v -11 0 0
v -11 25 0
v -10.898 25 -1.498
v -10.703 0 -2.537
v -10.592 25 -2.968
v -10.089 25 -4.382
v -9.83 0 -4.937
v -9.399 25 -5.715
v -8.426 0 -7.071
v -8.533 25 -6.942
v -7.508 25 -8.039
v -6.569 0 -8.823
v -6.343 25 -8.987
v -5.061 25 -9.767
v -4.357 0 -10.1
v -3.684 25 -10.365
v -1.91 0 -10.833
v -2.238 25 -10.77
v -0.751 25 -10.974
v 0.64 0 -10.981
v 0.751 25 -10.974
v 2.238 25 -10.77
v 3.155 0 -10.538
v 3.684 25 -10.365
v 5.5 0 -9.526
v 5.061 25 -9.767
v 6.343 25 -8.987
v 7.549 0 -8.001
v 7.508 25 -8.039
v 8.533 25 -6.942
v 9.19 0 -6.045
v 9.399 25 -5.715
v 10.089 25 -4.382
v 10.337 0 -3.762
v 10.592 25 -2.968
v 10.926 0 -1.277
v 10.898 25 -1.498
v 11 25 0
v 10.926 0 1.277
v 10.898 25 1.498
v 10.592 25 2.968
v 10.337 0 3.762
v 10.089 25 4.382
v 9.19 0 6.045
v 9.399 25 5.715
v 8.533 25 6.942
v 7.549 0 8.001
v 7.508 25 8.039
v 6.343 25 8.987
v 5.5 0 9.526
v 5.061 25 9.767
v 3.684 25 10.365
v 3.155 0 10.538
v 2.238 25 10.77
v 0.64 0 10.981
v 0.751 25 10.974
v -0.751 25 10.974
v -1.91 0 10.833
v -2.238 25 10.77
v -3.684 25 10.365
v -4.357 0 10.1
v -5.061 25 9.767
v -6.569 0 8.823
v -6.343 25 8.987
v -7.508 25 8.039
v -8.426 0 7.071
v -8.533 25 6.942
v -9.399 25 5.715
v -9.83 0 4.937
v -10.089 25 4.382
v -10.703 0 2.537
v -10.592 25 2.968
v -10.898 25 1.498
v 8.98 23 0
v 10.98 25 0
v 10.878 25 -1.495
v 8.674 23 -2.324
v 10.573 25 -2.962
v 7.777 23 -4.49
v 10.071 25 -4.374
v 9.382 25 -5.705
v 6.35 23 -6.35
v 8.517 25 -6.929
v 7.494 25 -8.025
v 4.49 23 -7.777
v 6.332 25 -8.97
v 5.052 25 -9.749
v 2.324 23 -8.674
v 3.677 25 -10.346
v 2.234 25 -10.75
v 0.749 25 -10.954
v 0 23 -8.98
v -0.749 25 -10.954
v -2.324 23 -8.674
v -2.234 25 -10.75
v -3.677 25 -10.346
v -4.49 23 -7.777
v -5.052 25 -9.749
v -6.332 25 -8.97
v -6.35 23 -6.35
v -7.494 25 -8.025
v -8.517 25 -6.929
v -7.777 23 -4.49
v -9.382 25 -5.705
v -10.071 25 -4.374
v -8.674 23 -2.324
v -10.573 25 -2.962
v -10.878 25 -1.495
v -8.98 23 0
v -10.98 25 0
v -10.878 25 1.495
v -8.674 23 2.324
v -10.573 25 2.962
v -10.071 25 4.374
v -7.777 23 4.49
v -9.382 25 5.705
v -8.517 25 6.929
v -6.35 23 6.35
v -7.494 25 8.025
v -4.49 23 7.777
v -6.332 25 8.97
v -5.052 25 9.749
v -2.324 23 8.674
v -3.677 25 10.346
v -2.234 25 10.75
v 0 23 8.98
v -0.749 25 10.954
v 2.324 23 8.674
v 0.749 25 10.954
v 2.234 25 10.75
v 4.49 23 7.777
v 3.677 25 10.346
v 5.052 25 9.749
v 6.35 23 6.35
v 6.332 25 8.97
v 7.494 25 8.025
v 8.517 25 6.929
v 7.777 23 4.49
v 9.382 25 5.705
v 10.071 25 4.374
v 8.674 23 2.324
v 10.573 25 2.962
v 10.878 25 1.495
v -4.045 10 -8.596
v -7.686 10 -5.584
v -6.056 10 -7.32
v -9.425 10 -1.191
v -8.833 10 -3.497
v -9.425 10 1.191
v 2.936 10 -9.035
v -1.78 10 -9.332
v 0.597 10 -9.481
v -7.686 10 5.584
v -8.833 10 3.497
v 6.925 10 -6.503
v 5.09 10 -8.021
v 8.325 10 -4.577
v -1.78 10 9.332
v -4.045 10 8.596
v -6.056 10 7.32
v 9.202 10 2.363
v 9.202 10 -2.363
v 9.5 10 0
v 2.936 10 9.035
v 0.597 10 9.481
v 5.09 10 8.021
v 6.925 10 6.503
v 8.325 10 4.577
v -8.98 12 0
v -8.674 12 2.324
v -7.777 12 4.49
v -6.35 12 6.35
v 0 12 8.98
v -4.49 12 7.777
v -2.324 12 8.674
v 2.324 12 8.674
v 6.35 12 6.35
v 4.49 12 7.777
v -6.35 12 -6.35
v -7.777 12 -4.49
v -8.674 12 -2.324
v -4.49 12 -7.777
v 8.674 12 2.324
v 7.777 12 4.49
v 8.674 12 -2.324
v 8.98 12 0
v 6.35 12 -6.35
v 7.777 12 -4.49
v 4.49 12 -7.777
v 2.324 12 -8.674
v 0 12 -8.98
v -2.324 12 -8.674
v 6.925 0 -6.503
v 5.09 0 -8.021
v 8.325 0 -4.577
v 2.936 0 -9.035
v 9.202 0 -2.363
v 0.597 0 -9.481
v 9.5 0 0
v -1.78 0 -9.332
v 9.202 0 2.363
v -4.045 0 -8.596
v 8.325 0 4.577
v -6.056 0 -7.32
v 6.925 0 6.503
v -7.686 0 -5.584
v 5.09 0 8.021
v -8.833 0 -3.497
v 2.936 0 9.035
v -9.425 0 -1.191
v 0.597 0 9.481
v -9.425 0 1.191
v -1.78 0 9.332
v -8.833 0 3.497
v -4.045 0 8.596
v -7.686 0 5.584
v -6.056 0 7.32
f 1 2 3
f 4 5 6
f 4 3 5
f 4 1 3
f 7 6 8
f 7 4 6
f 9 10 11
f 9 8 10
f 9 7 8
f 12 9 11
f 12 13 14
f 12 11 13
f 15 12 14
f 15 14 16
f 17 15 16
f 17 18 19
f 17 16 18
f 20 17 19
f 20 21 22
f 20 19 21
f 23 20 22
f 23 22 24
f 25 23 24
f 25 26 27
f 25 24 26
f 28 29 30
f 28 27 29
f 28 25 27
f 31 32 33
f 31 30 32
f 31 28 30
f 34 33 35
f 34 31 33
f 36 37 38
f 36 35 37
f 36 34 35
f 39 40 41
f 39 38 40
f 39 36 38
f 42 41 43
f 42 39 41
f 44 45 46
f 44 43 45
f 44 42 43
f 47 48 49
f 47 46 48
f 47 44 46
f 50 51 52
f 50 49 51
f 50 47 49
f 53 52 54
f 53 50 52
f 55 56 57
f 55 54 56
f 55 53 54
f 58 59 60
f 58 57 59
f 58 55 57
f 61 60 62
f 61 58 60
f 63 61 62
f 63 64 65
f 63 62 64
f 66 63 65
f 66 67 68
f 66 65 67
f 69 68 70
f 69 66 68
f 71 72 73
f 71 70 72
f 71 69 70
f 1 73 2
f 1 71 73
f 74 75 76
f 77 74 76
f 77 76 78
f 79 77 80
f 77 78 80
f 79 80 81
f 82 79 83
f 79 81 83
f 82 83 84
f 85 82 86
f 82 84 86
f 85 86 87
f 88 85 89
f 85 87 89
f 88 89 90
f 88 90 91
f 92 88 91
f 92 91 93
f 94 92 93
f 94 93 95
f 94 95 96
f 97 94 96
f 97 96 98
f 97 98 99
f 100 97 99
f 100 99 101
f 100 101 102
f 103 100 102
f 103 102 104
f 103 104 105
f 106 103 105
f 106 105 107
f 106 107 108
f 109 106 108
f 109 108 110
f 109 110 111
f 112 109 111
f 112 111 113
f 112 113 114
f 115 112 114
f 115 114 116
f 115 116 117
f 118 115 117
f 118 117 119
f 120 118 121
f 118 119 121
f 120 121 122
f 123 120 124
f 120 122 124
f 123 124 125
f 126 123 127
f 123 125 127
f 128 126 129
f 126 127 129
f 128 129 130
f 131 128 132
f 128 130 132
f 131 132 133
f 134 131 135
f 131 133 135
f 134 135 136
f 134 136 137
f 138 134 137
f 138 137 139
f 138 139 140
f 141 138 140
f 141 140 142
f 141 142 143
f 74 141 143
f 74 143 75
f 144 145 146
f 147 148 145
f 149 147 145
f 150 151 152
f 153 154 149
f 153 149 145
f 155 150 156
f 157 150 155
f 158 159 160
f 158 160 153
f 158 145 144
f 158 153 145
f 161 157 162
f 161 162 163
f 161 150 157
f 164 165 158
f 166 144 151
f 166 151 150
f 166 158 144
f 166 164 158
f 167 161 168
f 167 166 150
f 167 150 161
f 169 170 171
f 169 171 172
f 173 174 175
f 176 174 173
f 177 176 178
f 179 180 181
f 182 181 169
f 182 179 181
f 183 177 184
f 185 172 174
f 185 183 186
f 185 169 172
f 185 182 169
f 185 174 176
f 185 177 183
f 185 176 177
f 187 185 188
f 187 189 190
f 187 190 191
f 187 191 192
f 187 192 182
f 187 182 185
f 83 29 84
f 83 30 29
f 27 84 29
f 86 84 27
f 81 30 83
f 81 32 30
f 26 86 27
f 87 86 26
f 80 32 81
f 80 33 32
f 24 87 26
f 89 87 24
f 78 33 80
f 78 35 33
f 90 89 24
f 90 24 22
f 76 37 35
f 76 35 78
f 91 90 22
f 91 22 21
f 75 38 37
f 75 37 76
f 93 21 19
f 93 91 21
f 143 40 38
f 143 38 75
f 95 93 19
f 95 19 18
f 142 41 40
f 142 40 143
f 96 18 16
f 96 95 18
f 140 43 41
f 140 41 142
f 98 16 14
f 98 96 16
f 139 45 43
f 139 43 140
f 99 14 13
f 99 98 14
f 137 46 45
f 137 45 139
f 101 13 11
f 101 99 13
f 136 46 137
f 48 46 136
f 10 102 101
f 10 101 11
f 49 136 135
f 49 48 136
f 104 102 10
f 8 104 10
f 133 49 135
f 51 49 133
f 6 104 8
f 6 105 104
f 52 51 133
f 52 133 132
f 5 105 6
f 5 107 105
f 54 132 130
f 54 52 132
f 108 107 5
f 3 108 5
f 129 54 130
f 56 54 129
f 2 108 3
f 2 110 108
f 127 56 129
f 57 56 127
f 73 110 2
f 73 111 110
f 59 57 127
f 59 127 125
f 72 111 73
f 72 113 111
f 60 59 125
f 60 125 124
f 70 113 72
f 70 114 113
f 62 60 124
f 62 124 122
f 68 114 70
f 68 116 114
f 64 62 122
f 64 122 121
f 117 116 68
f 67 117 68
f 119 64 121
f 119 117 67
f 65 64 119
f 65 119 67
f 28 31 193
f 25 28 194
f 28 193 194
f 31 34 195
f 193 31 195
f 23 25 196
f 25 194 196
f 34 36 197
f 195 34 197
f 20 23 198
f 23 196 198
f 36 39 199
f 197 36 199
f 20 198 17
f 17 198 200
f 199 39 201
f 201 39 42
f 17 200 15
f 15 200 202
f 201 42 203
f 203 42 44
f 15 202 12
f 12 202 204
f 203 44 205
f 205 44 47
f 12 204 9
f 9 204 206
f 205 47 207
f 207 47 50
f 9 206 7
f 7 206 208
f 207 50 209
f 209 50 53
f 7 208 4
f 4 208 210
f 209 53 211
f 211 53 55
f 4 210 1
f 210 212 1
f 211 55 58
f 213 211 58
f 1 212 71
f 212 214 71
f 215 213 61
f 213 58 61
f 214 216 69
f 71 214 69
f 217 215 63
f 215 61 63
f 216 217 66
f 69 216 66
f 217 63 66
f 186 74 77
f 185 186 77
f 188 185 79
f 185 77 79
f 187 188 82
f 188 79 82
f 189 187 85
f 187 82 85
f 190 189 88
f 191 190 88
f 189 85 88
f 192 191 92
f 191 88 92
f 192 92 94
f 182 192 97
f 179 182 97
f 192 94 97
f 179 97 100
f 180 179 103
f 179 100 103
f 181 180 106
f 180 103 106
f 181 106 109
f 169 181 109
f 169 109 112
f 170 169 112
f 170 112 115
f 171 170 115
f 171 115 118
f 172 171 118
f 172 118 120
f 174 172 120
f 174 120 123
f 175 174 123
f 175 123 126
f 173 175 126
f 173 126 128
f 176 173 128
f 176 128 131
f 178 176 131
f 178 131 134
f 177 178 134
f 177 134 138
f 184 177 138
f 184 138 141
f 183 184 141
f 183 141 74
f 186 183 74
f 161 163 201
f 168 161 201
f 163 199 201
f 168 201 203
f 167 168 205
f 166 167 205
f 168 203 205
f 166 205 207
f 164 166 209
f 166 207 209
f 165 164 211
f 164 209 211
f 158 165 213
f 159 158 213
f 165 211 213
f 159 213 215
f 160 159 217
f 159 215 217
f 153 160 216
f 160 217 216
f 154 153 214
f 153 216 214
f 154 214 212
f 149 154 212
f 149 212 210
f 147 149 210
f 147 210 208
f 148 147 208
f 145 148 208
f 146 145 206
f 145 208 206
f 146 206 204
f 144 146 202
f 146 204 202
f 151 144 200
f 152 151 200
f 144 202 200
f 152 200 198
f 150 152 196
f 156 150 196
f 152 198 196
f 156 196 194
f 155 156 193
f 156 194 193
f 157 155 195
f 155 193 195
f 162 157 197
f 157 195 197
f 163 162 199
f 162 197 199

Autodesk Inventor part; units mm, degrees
ref_plane "YZ Plane" through (0, 0, 0) normal (1, 0, 0) x (0, 1, 0)
ref_plane "XZ Plane" through (0, 0, 0) normal (0, 1, 0) x (-1, 0, 0)
ref_plane "XY Plane" through (0, 0, 0) normal (0, 0, 1) x (1, 0, 0)
sketch "Sketch1" plane through (0, 0, 0) normal (0, 1, 0) x (-1, 0, 0)
  circle A0 centre (0, 0) radius 11
  dimension "d0" = 22
extrude "Extrusion1" add sketch "Sketch1" along normal blind 25
sketch "Sketch2" plane through (0, 0, 0) normal (0, -1, 0) x (1, 0, 0)
  circle A0 centre (0, 0) radius 9.5
  dimension "d3" = 19
extrude "Extrusion2" cut sketch "Sketch2" against normal blind 10
sketch "Sketch3" plane through (0, 25, 0) normal (0, 1, 0) x (1, 0, 0)
  circle A0 centre (0, 0) radius 8.98
  dimension "d6" = 17.96
extrude "Extrusion3" cut sketch "Sketch3" against normal blind 13
chamfer "Chamfer1" distance 2 angle 45 1 edges at (-8.98, 25, 0) measured on face at (-10.1331, 25, -1.5938)
properties part number "Cup"
